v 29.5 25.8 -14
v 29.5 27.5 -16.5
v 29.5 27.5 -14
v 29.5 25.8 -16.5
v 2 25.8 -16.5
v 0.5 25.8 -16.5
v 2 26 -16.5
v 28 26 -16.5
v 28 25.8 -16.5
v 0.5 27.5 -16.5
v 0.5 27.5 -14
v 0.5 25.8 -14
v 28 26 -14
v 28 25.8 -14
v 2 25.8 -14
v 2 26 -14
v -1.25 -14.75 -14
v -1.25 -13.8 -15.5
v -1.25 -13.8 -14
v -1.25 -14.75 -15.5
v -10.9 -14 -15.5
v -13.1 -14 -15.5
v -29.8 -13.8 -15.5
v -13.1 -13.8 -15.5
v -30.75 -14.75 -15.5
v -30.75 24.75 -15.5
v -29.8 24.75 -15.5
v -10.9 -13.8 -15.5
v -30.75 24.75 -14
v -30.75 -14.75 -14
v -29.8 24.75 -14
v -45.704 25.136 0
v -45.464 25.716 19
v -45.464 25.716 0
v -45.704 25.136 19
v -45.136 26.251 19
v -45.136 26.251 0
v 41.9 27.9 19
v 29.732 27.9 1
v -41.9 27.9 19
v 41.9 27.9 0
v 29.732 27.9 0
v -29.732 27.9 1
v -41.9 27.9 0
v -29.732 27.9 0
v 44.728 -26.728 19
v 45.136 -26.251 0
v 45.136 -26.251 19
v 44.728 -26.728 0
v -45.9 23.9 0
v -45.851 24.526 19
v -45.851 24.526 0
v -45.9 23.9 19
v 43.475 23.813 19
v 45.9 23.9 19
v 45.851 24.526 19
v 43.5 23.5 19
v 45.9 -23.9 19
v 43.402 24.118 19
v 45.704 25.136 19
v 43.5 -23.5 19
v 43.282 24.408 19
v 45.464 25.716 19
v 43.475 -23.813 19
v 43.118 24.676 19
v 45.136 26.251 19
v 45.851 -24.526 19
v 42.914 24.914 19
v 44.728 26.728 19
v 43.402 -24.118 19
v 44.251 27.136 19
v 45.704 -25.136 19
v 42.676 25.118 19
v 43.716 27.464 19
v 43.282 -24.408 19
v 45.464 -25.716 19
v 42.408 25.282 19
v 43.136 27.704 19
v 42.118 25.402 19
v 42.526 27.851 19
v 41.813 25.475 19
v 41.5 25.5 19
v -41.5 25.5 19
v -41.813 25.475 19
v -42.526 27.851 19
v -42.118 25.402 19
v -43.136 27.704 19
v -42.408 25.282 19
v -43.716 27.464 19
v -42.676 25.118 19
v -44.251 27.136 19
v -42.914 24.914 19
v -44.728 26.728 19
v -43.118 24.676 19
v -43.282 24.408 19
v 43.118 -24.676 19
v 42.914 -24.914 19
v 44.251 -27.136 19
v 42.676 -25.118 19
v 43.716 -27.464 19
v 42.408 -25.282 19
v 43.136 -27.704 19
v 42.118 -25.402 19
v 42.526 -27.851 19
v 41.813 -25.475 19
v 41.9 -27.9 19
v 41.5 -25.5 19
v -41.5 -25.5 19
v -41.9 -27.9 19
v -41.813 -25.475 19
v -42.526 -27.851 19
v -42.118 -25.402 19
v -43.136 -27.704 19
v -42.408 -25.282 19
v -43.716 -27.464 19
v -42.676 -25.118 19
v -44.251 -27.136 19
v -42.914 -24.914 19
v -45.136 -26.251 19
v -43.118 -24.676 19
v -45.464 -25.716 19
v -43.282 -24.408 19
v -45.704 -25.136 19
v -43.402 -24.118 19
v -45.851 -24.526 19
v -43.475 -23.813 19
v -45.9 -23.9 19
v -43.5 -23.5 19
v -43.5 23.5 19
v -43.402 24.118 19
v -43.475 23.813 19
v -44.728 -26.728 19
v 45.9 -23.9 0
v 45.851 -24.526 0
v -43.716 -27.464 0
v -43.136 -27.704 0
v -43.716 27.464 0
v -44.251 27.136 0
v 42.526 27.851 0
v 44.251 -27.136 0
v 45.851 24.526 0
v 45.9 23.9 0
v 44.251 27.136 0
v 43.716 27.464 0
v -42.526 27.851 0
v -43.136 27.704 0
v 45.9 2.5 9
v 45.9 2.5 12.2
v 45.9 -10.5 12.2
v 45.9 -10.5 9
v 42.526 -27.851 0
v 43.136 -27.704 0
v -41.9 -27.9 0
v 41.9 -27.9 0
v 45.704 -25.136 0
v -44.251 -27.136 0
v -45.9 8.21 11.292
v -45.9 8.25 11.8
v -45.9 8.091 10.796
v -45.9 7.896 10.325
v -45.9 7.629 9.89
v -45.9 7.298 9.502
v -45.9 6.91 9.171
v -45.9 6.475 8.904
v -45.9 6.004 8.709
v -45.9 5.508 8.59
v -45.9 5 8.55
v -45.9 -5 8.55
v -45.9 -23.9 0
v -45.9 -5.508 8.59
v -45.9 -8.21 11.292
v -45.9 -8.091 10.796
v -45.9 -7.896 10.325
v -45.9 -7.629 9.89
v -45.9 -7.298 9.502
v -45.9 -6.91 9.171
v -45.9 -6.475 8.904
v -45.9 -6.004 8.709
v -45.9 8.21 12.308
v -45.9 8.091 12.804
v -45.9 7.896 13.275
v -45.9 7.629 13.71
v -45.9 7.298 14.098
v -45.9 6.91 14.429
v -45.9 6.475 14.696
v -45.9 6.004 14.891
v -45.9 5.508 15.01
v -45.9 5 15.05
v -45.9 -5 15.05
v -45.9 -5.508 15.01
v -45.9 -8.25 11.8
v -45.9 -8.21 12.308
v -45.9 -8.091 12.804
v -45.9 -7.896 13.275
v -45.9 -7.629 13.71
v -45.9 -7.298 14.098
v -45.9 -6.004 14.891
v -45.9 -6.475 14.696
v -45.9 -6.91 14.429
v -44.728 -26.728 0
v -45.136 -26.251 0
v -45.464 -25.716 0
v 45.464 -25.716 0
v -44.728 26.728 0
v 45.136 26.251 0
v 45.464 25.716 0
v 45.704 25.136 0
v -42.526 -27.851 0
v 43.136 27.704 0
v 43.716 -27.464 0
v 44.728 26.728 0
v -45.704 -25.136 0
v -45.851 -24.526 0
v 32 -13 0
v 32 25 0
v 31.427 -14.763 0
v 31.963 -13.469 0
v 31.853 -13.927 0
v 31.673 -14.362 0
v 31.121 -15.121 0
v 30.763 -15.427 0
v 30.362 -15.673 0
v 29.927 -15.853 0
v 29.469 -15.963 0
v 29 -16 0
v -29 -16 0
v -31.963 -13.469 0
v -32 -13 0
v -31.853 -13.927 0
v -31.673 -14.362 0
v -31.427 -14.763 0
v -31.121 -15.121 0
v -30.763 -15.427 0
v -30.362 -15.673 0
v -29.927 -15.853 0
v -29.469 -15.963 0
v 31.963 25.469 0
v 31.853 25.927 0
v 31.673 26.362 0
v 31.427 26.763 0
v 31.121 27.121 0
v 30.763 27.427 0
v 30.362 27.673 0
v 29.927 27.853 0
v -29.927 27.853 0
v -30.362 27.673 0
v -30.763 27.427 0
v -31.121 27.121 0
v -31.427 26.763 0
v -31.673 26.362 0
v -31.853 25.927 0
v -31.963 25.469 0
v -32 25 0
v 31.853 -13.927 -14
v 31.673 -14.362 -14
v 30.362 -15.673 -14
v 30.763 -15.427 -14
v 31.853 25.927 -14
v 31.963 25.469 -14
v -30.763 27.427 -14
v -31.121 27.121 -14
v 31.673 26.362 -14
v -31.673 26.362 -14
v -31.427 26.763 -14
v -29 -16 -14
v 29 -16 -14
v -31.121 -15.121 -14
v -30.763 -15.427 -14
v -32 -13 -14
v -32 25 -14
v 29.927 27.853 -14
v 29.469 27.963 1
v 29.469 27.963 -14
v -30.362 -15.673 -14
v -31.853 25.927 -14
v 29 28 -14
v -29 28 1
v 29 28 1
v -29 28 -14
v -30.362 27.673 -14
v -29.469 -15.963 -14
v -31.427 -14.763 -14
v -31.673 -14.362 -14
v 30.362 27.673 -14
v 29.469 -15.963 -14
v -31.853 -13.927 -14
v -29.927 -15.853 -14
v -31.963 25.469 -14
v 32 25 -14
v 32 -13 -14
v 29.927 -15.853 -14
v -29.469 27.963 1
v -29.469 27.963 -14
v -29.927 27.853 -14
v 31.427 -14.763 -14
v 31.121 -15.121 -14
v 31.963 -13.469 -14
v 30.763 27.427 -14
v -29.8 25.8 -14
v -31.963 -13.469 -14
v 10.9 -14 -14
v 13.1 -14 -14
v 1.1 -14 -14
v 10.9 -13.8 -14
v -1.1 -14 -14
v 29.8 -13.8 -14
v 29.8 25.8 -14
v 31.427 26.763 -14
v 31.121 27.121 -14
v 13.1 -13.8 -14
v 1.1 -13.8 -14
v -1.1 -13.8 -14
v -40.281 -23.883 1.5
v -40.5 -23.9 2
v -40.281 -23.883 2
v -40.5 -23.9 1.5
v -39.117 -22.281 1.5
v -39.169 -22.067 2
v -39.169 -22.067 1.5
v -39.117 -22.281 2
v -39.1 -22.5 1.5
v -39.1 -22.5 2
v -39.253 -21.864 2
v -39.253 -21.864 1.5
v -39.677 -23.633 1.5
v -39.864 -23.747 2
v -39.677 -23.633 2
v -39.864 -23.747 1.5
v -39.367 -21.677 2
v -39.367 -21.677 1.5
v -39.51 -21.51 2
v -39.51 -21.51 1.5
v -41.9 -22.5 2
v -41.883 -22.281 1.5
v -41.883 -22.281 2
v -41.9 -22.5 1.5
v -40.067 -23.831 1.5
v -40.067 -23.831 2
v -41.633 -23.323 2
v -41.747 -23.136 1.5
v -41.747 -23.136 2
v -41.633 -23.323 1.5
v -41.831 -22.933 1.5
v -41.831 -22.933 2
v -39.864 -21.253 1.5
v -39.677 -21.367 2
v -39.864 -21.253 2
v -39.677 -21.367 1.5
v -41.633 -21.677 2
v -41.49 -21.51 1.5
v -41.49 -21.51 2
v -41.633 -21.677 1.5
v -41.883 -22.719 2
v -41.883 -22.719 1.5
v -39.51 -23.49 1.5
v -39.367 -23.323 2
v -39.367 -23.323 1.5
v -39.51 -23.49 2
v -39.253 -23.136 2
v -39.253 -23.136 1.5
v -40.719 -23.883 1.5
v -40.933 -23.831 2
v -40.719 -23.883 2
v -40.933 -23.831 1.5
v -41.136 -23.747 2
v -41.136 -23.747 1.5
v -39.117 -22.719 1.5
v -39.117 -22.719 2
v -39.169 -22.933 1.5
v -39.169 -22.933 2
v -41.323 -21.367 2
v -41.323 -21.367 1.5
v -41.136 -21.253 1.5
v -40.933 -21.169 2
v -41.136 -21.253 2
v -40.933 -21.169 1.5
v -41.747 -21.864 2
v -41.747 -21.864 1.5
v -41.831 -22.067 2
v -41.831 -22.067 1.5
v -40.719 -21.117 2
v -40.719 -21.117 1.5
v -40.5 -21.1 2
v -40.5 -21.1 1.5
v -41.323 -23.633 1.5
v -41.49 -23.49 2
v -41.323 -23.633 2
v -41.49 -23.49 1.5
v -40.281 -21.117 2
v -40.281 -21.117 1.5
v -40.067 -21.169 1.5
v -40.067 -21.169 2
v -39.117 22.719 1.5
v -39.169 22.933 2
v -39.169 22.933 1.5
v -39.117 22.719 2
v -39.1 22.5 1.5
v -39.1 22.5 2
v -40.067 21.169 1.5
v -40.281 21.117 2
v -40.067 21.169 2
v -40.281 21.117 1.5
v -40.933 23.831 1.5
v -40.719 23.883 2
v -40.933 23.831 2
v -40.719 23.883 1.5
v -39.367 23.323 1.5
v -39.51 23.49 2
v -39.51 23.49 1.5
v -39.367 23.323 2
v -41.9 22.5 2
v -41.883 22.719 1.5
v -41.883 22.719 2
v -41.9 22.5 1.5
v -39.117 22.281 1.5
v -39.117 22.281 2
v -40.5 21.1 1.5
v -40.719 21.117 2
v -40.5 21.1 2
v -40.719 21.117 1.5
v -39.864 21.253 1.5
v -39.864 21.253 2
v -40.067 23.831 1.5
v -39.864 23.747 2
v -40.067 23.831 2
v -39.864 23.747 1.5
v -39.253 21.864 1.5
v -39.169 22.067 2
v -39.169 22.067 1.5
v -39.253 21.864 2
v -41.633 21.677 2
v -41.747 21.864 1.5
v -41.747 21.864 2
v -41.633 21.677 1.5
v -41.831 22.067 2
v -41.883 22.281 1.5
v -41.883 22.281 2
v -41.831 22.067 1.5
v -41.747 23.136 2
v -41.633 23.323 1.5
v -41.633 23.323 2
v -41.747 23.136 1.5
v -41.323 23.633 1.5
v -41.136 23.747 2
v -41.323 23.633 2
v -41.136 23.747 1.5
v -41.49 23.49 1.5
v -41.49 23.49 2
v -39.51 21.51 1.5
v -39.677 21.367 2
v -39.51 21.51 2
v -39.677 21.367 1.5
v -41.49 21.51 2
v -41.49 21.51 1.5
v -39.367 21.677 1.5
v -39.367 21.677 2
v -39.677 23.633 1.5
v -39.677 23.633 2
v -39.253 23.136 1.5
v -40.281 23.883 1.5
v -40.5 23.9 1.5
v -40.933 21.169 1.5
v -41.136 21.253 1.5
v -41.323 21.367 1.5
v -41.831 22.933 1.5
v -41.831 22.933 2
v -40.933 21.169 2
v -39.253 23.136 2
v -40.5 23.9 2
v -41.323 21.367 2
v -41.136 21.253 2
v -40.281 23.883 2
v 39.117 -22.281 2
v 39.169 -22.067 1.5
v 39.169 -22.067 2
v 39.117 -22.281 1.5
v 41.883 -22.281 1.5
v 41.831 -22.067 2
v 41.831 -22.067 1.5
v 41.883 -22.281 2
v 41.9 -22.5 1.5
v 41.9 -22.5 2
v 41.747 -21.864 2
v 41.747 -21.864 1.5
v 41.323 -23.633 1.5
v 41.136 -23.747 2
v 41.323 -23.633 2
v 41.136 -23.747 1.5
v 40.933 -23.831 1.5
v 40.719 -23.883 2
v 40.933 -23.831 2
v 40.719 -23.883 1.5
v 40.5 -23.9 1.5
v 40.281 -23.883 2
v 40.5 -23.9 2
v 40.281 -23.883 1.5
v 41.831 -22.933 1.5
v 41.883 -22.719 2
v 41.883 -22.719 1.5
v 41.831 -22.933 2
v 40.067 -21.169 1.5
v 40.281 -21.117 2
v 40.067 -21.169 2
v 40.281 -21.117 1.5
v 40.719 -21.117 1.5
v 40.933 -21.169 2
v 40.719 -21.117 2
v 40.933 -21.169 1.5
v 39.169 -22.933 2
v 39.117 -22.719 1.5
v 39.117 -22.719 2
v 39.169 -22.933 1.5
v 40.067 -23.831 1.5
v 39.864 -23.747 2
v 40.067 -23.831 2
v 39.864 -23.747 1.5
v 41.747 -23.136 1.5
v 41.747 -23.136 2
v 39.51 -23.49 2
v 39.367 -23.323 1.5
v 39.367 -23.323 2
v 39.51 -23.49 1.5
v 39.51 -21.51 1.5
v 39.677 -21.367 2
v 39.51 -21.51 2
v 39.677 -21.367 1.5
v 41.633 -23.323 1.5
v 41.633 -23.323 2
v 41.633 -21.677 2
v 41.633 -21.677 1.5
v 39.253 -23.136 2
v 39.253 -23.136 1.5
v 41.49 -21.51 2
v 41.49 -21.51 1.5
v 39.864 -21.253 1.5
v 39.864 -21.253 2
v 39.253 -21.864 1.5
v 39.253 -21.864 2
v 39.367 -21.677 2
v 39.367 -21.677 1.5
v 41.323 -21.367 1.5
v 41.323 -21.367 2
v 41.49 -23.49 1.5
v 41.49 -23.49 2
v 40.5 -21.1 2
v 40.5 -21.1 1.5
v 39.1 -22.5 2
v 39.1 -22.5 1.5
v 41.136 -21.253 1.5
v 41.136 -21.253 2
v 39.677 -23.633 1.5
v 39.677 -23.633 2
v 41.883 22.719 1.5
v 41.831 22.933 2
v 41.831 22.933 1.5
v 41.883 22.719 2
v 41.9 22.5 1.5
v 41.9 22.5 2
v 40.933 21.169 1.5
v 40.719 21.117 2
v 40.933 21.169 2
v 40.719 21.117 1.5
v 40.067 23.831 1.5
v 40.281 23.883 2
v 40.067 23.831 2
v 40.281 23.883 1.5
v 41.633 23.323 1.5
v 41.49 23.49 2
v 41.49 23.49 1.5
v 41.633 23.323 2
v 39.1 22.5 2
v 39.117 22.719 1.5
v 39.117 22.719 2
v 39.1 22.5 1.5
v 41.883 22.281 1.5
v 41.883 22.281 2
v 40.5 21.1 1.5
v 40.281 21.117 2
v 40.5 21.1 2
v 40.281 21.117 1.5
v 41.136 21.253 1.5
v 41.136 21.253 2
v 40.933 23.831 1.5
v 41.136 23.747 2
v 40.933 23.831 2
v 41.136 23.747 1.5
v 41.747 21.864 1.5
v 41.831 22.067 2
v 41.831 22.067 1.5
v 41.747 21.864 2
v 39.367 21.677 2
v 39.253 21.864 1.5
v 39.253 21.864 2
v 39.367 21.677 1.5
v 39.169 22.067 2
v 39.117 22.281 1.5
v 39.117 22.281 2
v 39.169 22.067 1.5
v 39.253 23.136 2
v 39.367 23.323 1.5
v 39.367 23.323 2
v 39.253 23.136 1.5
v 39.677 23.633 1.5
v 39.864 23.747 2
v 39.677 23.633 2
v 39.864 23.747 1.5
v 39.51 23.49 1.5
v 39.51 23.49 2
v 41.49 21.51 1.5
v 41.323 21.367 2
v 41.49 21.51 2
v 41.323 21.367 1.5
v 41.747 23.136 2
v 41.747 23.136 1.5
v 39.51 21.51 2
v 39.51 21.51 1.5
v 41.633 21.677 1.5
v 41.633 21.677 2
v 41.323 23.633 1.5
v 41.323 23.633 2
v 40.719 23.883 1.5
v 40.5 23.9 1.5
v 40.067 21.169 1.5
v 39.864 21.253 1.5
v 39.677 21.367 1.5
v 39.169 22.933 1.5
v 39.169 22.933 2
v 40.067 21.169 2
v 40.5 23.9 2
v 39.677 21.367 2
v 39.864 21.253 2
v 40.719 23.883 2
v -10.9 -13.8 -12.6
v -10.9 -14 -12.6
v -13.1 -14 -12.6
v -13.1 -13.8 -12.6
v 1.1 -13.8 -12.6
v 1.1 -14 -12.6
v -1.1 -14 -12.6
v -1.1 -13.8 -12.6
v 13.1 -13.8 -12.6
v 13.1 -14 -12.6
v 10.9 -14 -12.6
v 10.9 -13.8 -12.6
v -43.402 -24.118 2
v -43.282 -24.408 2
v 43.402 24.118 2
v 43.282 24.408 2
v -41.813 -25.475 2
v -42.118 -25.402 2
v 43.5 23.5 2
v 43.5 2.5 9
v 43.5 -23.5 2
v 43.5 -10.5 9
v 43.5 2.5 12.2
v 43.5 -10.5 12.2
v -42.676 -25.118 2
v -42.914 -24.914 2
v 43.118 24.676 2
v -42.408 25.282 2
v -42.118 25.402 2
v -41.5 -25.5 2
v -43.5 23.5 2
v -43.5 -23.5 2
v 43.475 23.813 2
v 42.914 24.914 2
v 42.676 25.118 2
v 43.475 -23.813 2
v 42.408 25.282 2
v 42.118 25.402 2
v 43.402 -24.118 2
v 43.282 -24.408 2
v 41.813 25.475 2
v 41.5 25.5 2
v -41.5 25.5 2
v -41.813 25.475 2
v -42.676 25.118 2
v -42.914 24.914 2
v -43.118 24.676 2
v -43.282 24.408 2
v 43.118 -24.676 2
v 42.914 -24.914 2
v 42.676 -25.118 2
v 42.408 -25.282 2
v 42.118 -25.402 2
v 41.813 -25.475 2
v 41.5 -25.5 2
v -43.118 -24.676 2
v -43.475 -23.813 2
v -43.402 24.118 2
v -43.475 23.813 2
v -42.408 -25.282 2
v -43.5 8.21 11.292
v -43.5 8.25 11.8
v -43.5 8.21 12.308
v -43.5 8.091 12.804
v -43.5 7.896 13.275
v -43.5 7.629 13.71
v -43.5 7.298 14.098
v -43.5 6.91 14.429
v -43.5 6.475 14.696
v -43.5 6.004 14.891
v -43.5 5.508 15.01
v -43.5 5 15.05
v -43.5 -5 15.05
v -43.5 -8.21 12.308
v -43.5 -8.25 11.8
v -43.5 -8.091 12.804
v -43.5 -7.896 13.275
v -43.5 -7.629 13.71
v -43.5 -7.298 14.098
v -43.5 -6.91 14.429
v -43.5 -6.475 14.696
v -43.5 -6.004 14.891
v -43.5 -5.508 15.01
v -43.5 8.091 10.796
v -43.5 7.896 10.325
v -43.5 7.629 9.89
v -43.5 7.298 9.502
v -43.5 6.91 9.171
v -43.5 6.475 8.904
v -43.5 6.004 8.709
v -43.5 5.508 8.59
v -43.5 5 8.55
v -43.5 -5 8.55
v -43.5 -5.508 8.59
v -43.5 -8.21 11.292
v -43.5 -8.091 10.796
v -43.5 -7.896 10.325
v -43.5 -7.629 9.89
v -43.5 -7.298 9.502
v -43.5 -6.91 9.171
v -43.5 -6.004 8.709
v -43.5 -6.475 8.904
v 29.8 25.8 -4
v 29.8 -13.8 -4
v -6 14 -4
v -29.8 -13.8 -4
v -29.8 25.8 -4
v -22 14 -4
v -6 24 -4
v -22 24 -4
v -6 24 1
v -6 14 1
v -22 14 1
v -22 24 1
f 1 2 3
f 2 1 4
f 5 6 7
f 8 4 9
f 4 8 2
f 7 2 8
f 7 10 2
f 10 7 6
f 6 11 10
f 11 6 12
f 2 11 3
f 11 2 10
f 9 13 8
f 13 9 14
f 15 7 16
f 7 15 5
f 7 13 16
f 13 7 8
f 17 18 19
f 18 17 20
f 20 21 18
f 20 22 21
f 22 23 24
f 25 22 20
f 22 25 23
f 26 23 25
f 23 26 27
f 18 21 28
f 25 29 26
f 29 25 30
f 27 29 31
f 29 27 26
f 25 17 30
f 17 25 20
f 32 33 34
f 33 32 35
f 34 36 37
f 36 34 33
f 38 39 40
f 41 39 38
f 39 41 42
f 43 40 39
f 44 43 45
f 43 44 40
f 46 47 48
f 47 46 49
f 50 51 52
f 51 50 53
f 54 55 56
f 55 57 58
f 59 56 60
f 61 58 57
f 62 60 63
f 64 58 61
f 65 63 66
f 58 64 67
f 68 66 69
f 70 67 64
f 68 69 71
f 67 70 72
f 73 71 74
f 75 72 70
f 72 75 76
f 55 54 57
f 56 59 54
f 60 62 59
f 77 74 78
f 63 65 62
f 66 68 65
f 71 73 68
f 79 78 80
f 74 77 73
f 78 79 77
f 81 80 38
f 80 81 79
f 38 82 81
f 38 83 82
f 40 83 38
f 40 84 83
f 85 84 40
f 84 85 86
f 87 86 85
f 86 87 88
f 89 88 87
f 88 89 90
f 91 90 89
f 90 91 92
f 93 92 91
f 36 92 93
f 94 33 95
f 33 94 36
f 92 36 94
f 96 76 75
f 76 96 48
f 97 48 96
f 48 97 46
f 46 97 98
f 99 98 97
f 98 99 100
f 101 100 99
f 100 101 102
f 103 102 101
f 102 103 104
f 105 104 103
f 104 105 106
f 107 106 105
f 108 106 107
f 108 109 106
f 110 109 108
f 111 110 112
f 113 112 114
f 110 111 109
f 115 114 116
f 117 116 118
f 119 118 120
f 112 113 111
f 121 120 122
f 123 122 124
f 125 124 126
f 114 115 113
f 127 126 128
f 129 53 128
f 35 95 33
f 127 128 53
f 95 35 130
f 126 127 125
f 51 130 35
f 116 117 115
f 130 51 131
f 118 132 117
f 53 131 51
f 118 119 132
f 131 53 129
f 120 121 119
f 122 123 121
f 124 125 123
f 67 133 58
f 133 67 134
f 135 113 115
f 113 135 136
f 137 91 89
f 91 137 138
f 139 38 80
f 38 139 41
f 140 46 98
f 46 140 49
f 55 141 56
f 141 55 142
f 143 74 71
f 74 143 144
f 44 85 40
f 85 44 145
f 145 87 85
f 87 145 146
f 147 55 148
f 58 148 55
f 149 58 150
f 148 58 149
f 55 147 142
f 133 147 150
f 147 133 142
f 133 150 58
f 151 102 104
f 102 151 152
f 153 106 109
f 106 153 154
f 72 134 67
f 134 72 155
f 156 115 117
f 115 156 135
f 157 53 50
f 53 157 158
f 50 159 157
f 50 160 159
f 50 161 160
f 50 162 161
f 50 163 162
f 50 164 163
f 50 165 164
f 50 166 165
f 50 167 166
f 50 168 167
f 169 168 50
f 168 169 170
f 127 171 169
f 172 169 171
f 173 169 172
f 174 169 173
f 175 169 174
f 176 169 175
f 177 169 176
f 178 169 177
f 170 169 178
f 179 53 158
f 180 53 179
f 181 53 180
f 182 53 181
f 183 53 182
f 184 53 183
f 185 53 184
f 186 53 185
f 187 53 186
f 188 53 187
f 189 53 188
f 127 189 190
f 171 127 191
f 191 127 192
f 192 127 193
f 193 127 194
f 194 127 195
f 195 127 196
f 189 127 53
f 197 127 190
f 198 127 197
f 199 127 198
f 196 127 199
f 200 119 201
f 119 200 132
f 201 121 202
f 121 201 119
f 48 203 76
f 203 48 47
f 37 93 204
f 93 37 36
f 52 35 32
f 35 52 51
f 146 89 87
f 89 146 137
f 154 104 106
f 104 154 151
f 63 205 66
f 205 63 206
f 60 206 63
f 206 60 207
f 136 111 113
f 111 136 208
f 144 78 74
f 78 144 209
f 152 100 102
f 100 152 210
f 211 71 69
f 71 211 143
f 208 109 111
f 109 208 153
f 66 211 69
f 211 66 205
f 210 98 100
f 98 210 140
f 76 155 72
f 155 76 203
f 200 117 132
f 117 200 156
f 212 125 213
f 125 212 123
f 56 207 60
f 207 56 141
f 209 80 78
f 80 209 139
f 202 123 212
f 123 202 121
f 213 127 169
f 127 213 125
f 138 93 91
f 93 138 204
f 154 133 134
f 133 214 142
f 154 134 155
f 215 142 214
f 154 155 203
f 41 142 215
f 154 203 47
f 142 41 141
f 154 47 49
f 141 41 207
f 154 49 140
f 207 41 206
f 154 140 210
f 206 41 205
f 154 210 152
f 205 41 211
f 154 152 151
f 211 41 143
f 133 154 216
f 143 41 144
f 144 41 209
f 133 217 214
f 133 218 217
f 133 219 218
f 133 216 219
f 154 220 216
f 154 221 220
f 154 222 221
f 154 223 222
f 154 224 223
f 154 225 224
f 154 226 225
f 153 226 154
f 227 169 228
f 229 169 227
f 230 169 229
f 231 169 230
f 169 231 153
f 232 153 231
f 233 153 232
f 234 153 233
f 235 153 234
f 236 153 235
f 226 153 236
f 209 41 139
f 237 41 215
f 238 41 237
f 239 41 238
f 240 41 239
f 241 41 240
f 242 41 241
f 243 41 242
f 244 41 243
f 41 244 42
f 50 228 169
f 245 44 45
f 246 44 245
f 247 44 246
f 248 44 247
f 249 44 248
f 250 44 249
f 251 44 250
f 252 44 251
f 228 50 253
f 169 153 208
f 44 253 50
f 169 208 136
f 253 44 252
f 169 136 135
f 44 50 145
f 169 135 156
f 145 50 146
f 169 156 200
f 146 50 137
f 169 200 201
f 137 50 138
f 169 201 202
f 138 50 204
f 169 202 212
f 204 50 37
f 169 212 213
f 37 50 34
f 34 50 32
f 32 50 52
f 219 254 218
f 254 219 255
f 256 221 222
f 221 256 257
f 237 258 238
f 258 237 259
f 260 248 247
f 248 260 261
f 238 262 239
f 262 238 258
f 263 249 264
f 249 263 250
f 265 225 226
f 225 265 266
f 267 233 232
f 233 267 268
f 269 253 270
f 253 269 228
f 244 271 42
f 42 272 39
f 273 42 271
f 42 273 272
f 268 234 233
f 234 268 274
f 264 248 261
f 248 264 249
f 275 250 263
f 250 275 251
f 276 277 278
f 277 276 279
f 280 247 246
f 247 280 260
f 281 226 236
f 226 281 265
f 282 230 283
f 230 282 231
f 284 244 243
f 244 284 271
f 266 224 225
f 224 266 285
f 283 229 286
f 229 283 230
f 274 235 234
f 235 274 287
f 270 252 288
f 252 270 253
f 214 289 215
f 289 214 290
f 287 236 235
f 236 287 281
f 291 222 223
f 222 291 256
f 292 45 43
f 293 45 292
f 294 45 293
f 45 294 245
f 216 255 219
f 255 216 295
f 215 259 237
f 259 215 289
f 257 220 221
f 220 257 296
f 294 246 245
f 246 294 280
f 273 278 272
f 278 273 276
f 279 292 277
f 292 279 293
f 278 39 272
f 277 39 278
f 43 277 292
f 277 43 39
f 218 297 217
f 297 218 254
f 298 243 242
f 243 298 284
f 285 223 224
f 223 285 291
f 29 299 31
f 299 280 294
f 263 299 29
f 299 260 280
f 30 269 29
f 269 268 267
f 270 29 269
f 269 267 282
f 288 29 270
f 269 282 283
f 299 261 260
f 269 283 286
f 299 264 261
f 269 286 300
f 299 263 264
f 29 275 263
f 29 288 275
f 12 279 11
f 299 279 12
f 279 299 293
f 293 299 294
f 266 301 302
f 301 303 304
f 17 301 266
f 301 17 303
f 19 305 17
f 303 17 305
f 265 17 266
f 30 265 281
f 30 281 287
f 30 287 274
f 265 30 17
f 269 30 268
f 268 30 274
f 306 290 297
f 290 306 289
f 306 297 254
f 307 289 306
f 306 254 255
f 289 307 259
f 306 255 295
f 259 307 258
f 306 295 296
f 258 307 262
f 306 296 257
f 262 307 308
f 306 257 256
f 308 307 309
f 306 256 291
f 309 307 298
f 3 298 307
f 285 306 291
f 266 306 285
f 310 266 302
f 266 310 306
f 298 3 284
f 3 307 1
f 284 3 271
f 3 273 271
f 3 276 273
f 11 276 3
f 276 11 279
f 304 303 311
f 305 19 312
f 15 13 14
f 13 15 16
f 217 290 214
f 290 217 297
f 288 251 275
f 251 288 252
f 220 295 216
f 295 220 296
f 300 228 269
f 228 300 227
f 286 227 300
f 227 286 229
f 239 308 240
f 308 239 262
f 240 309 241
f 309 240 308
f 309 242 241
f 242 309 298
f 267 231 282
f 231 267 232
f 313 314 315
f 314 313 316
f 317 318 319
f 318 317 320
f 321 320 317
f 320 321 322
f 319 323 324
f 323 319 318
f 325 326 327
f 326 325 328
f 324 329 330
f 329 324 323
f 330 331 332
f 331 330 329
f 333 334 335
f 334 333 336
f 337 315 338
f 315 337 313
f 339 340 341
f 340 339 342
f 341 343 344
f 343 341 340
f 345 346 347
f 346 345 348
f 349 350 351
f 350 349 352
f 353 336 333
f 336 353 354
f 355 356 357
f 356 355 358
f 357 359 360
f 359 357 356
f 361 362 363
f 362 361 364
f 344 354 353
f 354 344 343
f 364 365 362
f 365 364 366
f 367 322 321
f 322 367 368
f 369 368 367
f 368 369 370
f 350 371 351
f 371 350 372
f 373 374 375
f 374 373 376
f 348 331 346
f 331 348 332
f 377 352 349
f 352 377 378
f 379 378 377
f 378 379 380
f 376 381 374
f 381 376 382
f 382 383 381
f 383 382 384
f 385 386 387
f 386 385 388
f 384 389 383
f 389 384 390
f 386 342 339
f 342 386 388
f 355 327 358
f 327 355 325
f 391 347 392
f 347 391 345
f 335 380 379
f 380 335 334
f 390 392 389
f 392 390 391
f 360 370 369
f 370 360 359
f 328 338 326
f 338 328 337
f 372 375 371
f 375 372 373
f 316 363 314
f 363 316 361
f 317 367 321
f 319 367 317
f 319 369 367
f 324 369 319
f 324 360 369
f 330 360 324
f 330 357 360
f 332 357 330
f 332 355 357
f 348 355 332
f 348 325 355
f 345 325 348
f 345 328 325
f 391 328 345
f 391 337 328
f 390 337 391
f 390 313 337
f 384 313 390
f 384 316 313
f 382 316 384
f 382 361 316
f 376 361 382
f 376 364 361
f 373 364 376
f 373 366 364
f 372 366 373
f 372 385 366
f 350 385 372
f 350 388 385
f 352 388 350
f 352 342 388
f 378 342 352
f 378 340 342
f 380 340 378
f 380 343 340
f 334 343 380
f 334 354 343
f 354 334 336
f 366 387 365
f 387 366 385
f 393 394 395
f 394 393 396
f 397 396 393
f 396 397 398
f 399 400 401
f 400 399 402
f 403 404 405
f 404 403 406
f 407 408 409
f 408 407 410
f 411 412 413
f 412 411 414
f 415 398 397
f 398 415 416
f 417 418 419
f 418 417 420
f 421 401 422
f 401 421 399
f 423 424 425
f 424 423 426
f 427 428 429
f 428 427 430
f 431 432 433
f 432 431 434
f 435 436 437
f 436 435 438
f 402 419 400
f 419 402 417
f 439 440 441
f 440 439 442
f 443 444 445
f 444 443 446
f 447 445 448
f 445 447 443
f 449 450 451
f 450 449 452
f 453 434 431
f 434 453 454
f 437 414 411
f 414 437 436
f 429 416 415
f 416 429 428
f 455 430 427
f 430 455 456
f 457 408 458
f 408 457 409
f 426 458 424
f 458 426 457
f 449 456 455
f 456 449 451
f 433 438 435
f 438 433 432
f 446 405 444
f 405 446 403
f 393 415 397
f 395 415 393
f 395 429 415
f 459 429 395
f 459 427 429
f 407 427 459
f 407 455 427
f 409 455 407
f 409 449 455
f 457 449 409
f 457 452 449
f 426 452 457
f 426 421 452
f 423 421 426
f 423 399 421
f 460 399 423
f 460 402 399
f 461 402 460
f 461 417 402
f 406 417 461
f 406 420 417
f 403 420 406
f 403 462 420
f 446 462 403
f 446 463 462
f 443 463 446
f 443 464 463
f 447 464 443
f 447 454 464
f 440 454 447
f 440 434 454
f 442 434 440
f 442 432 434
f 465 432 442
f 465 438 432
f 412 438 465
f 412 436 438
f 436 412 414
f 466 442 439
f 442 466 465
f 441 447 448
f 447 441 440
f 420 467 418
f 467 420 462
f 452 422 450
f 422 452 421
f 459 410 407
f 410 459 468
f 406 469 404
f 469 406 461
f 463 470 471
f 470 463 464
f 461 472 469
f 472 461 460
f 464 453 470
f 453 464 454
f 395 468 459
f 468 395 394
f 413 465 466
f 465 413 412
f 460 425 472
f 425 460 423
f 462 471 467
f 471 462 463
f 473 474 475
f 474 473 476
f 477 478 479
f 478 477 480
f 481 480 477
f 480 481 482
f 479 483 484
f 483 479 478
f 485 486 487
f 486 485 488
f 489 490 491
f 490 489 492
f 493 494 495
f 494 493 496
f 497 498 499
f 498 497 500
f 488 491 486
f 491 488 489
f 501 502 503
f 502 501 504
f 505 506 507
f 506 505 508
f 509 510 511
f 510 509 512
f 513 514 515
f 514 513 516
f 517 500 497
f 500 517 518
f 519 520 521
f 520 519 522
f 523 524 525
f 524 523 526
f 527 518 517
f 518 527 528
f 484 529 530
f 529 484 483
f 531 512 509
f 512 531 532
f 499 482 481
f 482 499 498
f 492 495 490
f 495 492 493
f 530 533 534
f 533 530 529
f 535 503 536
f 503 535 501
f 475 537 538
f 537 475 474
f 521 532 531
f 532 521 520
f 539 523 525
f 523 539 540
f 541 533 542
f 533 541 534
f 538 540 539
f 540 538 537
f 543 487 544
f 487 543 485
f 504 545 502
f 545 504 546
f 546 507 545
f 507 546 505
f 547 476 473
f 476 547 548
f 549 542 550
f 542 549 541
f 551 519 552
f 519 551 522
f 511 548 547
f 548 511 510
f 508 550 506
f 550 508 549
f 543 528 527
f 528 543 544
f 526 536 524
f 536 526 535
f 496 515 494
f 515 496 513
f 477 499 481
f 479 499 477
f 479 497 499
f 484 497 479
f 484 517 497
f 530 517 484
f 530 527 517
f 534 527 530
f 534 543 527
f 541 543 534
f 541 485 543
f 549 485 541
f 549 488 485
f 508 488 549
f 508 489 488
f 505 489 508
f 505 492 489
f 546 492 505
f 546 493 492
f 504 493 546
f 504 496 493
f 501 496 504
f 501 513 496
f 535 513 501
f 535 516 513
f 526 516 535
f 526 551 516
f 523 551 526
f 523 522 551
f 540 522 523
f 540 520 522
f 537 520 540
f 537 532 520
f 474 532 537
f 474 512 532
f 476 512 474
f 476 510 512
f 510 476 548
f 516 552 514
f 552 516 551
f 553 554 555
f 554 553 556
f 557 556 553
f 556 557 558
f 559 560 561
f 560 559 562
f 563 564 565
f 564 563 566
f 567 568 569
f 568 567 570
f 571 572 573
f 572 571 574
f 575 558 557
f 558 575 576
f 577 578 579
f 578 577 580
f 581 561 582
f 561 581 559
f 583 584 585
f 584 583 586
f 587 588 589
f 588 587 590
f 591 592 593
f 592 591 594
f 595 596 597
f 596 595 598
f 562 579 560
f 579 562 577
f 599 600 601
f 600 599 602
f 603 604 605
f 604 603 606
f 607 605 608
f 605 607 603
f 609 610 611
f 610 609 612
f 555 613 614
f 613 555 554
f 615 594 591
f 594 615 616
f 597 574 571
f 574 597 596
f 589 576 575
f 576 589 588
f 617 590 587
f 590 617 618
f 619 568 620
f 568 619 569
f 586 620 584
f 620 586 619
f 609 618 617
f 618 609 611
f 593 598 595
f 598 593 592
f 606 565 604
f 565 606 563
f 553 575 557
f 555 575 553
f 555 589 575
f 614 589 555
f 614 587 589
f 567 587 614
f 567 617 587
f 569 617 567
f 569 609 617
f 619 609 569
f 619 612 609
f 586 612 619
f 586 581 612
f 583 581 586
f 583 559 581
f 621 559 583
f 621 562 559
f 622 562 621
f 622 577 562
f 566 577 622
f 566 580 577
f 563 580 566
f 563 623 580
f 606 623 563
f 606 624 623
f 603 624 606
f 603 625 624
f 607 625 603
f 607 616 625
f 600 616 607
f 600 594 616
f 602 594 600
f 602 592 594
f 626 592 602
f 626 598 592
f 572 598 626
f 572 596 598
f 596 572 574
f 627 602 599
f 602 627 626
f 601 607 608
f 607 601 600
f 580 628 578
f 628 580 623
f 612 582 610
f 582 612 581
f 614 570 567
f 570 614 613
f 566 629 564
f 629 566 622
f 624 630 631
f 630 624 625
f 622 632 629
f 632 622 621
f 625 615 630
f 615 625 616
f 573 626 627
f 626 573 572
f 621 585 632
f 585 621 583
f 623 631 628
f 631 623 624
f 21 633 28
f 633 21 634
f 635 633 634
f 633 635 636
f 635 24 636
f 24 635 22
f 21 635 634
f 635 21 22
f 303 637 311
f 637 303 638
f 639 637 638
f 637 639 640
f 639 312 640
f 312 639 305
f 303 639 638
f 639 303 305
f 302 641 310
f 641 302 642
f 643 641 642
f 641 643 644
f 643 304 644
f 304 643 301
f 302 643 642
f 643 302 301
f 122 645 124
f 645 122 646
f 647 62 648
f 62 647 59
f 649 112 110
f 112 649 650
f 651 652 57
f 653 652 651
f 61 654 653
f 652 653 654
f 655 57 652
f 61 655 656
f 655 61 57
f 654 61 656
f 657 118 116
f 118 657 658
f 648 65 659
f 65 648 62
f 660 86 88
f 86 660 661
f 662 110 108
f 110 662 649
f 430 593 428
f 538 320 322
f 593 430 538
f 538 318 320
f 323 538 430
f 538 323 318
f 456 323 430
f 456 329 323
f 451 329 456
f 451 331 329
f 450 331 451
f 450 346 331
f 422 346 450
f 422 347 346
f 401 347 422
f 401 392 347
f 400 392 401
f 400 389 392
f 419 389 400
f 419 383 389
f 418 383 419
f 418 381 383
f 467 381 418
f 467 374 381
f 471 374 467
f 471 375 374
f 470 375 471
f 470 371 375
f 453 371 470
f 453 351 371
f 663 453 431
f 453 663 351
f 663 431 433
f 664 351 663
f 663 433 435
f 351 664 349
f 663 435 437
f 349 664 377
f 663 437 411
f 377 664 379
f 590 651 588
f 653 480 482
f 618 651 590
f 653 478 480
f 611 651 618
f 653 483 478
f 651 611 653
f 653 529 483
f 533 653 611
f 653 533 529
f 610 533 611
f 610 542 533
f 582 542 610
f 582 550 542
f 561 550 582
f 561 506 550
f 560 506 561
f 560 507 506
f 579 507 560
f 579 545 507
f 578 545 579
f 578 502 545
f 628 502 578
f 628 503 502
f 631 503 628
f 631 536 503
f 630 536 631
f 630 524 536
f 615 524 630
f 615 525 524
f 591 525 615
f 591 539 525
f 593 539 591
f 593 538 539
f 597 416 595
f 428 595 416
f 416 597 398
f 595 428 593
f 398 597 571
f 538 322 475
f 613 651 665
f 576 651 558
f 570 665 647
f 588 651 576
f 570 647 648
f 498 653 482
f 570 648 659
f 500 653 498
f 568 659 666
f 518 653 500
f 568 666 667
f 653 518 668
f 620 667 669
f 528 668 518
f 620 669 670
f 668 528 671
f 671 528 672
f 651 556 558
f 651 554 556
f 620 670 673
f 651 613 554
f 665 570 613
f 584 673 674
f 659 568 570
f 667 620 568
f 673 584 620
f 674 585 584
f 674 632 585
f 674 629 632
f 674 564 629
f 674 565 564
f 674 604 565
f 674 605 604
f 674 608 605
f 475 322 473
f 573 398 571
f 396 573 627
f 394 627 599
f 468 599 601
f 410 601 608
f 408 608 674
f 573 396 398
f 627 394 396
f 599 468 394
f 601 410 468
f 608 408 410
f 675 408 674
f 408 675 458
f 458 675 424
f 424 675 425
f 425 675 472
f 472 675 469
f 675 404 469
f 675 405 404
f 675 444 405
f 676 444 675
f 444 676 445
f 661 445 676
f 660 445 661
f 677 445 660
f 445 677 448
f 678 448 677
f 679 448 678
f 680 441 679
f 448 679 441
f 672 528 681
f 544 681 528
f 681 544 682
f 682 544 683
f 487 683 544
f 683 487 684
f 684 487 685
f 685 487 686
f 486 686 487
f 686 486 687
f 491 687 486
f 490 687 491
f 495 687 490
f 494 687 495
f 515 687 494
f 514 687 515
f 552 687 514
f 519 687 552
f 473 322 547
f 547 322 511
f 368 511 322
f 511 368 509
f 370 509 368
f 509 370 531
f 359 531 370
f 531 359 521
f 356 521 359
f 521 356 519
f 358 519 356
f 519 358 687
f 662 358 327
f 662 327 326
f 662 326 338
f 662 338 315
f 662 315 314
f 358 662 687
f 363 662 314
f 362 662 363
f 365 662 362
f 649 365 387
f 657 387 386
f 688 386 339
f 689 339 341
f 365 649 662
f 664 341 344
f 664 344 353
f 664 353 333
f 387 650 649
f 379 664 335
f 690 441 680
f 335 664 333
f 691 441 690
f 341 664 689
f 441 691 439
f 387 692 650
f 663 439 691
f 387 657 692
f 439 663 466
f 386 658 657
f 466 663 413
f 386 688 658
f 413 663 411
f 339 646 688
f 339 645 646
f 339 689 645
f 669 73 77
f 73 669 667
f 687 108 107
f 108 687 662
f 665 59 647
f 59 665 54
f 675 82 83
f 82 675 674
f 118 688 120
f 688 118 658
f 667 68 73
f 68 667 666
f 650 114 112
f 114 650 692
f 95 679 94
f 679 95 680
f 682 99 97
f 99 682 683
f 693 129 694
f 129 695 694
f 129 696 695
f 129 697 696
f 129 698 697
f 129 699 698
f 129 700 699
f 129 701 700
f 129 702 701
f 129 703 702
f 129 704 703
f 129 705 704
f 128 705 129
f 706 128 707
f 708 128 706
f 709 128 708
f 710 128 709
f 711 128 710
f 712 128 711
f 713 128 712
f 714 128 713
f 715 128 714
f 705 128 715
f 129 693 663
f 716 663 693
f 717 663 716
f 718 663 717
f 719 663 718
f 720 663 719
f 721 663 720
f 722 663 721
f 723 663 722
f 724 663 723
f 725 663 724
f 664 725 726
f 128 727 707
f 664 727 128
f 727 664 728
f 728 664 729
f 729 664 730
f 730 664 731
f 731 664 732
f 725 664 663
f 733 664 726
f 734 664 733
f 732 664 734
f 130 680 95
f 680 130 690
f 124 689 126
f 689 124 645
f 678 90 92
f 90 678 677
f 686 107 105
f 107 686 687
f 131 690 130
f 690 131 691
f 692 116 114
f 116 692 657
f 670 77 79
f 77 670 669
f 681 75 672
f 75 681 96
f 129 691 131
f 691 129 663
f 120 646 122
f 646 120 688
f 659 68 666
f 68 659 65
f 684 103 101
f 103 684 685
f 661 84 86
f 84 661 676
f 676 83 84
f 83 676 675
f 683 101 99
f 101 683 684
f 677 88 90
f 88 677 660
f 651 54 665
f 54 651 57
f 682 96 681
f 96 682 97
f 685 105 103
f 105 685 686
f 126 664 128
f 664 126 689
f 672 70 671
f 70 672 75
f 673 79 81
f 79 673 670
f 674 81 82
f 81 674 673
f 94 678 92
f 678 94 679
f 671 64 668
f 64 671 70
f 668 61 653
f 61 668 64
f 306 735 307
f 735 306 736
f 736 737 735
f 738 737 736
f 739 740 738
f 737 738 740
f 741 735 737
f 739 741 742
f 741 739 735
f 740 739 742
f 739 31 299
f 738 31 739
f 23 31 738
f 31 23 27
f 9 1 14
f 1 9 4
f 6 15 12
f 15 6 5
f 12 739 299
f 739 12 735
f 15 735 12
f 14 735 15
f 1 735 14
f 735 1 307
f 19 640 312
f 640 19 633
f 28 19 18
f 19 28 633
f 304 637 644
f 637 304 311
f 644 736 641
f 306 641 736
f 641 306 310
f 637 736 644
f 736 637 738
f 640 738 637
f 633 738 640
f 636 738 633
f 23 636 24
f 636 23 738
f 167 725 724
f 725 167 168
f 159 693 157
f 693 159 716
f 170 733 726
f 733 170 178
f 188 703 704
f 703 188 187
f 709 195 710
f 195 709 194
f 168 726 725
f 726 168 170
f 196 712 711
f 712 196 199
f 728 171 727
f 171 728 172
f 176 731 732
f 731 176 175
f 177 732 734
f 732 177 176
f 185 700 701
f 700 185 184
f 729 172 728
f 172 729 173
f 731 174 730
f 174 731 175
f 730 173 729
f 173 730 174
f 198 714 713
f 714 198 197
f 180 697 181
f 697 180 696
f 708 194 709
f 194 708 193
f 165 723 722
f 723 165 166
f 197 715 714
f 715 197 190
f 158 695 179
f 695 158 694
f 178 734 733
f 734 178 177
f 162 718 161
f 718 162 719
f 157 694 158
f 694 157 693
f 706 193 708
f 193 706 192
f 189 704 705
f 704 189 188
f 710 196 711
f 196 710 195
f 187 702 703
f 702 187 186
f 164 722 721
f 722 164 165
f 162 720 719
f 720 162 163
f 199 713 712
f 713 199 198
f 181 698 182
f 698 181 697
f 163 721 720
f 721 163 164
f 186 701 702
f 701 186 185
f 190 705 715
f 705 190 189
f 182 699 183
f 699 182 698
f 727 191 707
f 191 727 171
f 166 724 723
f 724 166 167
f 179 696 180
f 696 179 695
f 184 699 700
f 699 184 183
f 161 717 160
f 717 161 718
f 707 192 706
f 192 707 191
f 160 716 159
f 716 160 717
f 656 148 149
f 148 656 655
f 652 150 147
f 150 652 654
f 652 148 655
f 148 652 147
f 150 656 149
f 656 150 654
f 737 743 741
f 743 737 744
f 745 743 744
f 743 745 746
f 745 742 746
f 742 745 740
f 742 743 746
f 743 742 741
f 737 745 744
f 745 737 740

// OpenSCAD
// ============================================================================
// CYD ESP32-C5 FlightRadar & Aerospace Instrument - 3D Printable Enclosure
// Compatible with: RockBase NM-CYD-C5 (ESP32-C5 2.8" TFT Touch) + GY-GPS6MV2
// Features Dedicated Internal Compartments for BOTH GPS Receiver & Patch Antenna!
// Designed for 3D Printing: FDM (PLA/PETG/ABS) or Resin (SLA)
// ============================================================================

/* [Model View Selection] */
// Select which component to preview or render
part_to_show = "rear_backpack"; // [assembly:Full Assembly, bezel:Standard Front Bezel, rear_backpack:Rear Enclosure with GPS Backpack, stand:Desk Stand 25deg, bezel_toppod:Top-Pod Bezel, rear_toppod:Top-Pod Rear Enclosure]

/* [Print & Fit Tolerances] */
nozzle_dia      = 0.4;  // Nozzle diameter (mm)
clearance       = 0.5;  // General clearance for slide/drop-in fit (mm)
wall_t          = 2.4;  // Enclosure wall thickness (mm)
floor_t         = 2.0;  // Rear enclosure floor thickness (mm)
bezel_t         = 4.0;  // Front bezel thickness (mm)

/* [Hardware Dimensions] */
pcb_w           = 86.0; // NM-CYD-C5 PCB width (mm)
pcb_h           = 50.0; // NM-CYD-C5 PCB height (mm)
pcb_t           = 1.6;  // PCB thickness (mm)
standoff_h      = 6.0;  // Standoff height off rear wall (mm)

// Corner Mounting Holes (M3 / 81mm x 45mm spacing)
screw_dist_x    = 81.0; 
screw_dist_y    = 45.0;
screw_hole_d    = 3.2;  // M3 clearance hole
screw_head_d    = 6.0;  // M3 socket head diameter
screw_head_h    = 2.2;  // M3 counterbore depth
boss_d          = 7.0;  // Standoff boss outer diameter
boss_pilot_d    = 2.8;  // Standoff pilot hole for self-tapping M3

/* [Display Cutout] */
disp_view_w     = 61.0; // Viewable LCD window width (mm)
disp_view_h     = 44.0; // Viewable LCD window height (mm)
disp_glass_w    = 69.5; // Glass panel outer width (mm)
disp_glass_h    = 49.5; // Glass panel outer height (mm)
disp_recess_d   = 1.8;  // Glass panel recess depth (mm)

/* [WS2812 Indicator Beacon] */
led_x           = -28.0;// LED X offset from center (mm)
led_y           = 22.5; // LED Y offset from center (mm)
led_aperture_d  = 3.2;  // Outer light port diameter (mm)
led_cone_d      = 5.0;  // Inner light funnel diameter (mm)

/* [GY-GPS6MV2 Receiver & Ceramic Antenna Chambers] */
gps_rx_w        = 26.5; // Receiver module bay width (mm)
gps_rx_h        = 36.5; // Receiver module bay length (mm)
gps_ant_w       = 26.0; // Ceramic antenna pocket width (mm)
gps_ant_h       = 26.0; // Ceramic antenna pocket length (mm)
gps_ant_d       = 9.0;  // Ceramic antenna pocket depth (mm)

/* [GPS Backpack Dimensions] */
bp_w            = 64.0; // Backpack outer width (mm)
bp_h            = 44.0; // Backpack outer height (mm)
bp_d            = 14.0; // Backpack depth extending behind shell (mm)

/* [Desk Stand Angle] */
stand_tilt_deg  = 25.0; // Desktop viewing tilt angle (degrees)

// Calculated bounding parameters
outer_w         = pcb_w + (wall_t * 2) + (clearance * 2); // 91.8 -> 93.0 mm
outer_h         = pcb_h + (wall_t * 2) + (clearance * 2); // 55.8 -> 57.0 mm
rear_depth      = 19.0; // Main enclosure depth (mm)

$fn = 40; // Circle facet resolution

// ============================================================================
// TOP-LEVEL SELECTION
// ============================================================================
if (part_to_show == "assembly") {
    assembly_view();
} else if (part_to_show == "bezel") {
    front_bezel();
} else if (part_to_show == "rear_backpack") {
    rear_enclosure_backpack();
} else if (part_to_show == "stand") {
    desk_stand_25deg();
} else if (part_to_show == "bezel_toppod") {
    front_bezel_toppod();
} else if (part_to_show == "rear_toppod") {
    rear_enclosure_toppod();
}

// ============================================================================
// MODULE: FRONT BEZEL (Standard 93x57mm)
// ============================================================================
module front_bezel() {
    difference() {
        // Outer Faceplate with Rounded Corners
        hull() {
            for (x = [-outer_w/2 + 4, outer_w/2 - 4]) {
                for (y = [-outer_h/2 + 4, outer_h/2 - 4]) {
                    translate([x, y, 0])
                        cylinder(r = 4, h = bezel_t);
                }
            }
        }

        // 1. LCD Active Display Aperture (with 45° touch bevel)
        translate([0, 0, -0.1]) {
            cube([disp_view_w, disp_view_h, bezel_t + 0.2], center = true);
        }
        // Chamfered bezel edge for smooth finger touch swipe
        translate([0, 0, bezel_t]) {
            hull() {
                cube([disp_view_w + 3.0, disp_view_h + 3.0, 0.01], center = true);
                translate([0, 0, -1.5])
                    cube([disp_view_w, disp_view_h, 0.01], center = true);
            }
        }

        // 2. Rear LCD Glass Panel Seating Recess
        translate([0, 0, -0.1]) {
            cube([disp_glass_w, disp_glass_h, disp_recess_d + 0.1], center = true);
        }

        // 3. WS2812 Beacon Light Guide
        translate([led_x, led_y, -0.1]) {
            cylinder(d1 = led_cone_d, d2 = led_aperture_d, h = bezel_t + 0.2);
        }

        // 4. Corner M3 Counterbored Screw Holes
        for (x = [-screw_dist_x/2, screw_dist_x/2]) {
            for (y = [-screw_dist_y/2, screw_dist_y/2]) {
                translate([x, y, -0.1]) {
                    cylinder(d = screw_hole_d, h = bezel_t + 0.2);
                    translate([0, 0, bezel_t - screw_head_h + 0.1])
                        cylinder(d = screw_head_d, h = screw_head_h + 0.2);
                }
            }
        }
    }
}

// ============================================================================
// MODULE: REAR ENCLOSURE (With Integrated GPS Backpack & Antenna Tray)
// ============================================================================
module rear_enclosure_backpack() {
    difference() {
        union() {
            // Main Outer Rounded Body
            hull() {
                for (x = [-outer_w/2 + 4, outer_w/2 - 4]) {
                    for (y = [-outer_h/2 + 4, outer_h/2 - 4]) {
                        translate([x, y, 0])
                            cylinder(r = 4, h = rear_depth);
                    }
                }
            }

            // GPS Backpack Outer Extension (Extending backwards)
            translate([-bp_w/2, -16.0, -bp_d]) {
                hull() {
                    for (x = [3, bp_w - 3]) {
                        for (y = [3, bp_h - 3]) {
                            translate([x, y, 0])
                                cylinder(r = 3, h = bp_d + 1);
                        }
                    }
                }
            }

            // Standoff Bosses for PCB Mounting
            for (x = [-screw_dist_x/2, screw_dist_x/2]) {
                for (y = [-screw_dist_y/2, screw_dist_y/2]) {
                    translate([x, y, floor_t])
                        cylinder(d = boss_d, h = standoff_h);
                }
            }

            // Internal Antenna Retention Lips
            translate([15.0, 13.0, -bp_d + 2.0]) {
                difference() {
                    cube([gps_ant_w + 3.0, gps_ant_h + 3.0, gps_ant_d], center = true);
                    cube([gps_ant_w, gps_ant_h, gps_ant_d + 1], center = true);
                }
            }

            // Internal GPS Receiver Board Rails
            translate([-16.0, 5.0, -bp_d + 2.0]) {
                difference() {
                    cube([gps_rx_w + 3.0, gps_rx_h + 3.0, 7.0], center = true);
                    cube([gps_rx_w, gps_rx_h, 8.0], center = true);
                }
            }
        }

        // 1. Hollow Inner PCB Cavity
        translate([0, 0, floor_t]) {
            hull() {
                for (x = [-(pcb_w + clearance*2)/2 + 2, (pcb_w + clearance*2)/2 - 2]) {
                    for (y = [-(pcb_h + clearance*2)/2 + 2, (pcb_h + clearance*2)/2 - 2]) {
                        translate([x, y, 0])
                            cylinder(r = 2, h = rear_depth + 1);
                    }
                }
            }
        }

        // 2. Hollow GPS Backpack Cavity
        translate([0, 6.0, -bp_d + 2.0]) {
            cube([bp_w - 4.4, bp_h - 4.4, bp_d + 2.0], center = true);
        }

        // 3. M3 Screw Pilot Holes in Standoff Bosses
        for (x = [-screw_dist_x/2, screw_dist_x/2]) {
            for (y = [-screw_dist_y/2, screw_dist_y/2]) {
                translate([x, y, floor_t - 0.5])
                    cylinder(d = boss_pilot_d, h = standoff_h + 1.0);
            }
        }

        // 4. USB-C Power Connector Cutout (Left Side Wall)
        translate([-outer_w/2, 0, floor_t + standoff_h + pcb_t/2 + 3]) {
            hull() {
                translate([0, -5, 0]) rotate([0, 90, 0]) cylinder(d = 6.5, h = wall_t * 2, center = true);
                translate([0,  5, 0]) rotate([0, 90, 0]) cylinder(d = 6.5, h = wall_t * 2, center = true);
            }
        }

        // 5. MicroSD Card Access Slot (Right Side Wall)
        translate([outer_w/2, -4, floor_t + standoff_h + pcb_t + 1]) {
            cube([wall_t * 2, 13.0, 3.2], center = true);
        }

        // 6. Direct Wire Routing Aperture from GPS to P5 LP-UART Header
        translate([-14.0, 19.0, -2.0]) {
            cube([16.0, 10.0, floor_t + 4.0], center = true);
        }

        // 7. Tactical Airflow Cooling Louvers on Backpack Base
        for (i = [-1 : 1]) {
            translate([i * 12, -6, -bp_d - 0.1]) {
                cube([2.2, 16.0, 3.0], center = true);
            }
        }
    }
}

// ============================================================================
// MODULE: DESKTOP STAND (25-DEGREE ERGONOMIC CRADLE)
// ============================================================================
module desk_stand_25deg() {
    stand_w = 78.0;
    stand_d = 72.0;
    stand_h = 32.0;

    difference() {
        // Main Base Block
        translate([-stand_w/2, -stand_d/2, 0]) {
            cube([stand_w, stand_d, stand_h]);
        }

        // 25-Degree Tilted Enclosure Resting Cradle Pocket
        translate([0, 10, 14]) {
            rotate([stand_tilt_deg, 0, 0]) {
                cube([outer_w + 1.4, outer_h + 1.4, 40.0], center = true);
            }
        }

        // Central Clearance Recess for GPS Backpack
        translate([0, -2, stand_h/2]) {
            cube([bp_w + 2.0, stand_d, stand_h + 2], center = true);
        }

        // Rear USB-C Cable Route Arch
        translate([0, -stand_d/2 + 10, -0.1]) {
            cylinder(d = 16.0, h = stand_h + 1);
            translate([-8, -15, 0])
                cube([16.0, 20.0, stand_h + 1]);
        }

        // Underside Rubber Foot Sockets
        for (fx = [-stand_w/2 + 8, stand_w/2 - 8]) {
            for (fy = [-stand_d/2 + 8, stand_d/2 - 8]) {
                translate([fx, fy, -0.1])
                    cylinder(d = 8.5, h = 1.8);
            }
        }
    }
}

// ============================================================================
// MODULE: TACTICAL AVIONICS TOP-POD BEZEL (93x82mm with Radome Brow)
// ============================================================================
module front_bezel_toppod() {
    top_h = 82.0;
    difference() {
        hull() {
            for (x = [-outer_w/2 + 4, outer_w/2 - 4]) {
                for (y = [-top_h/2 + 4, top_h/2 - 4]) {
                    translate([x, y, 0]) cylinder(r = 4, h = bezel_t);
                }
            }
        }
        // LCD window centered in lower 57mm
        translate([0, -12.5, -0.1]) cube([disp_view_w, disp_view_h, bezel_t + 0.2], center = true);
        translate([0, -12.5, -0.1]) cube([disp_glass_w, disp_glass_h, disp_recess_d + 0.1], center = true);
        translate([led_x, -12.5 + 22.5, -0.1]) cylinder(d1 = 5.0, d2 = 3.2, h = bezel_t + 0.2);
        for (x = [-screw_dist_x/2, screw_dist_x/2]) {
            for (y = [-12.5 - screw_dist_y/2, -12.5 + screw_dist_y/2]) {
                translate([x, y, -0.1]) {
                    cylinder(d = 3.2, h = bezel_t + 0.2);
                    translate([0, 0, bezel_t - 2.0]) cylinder(d = 6.0, h = 2.2);
                }
            }
        }
    }
}

// ============================================================================
// MODULE: TACTICAL AVIONICS TOP-POD REAR ENCLOSURE
// ============================================================================
module rear_enclosure_toppod() {
    top_h = 82.0;
    difference() {
        union() {
            hull() {
                for (x = [-outer_w/2 + 4, outer_w/2 - 4]) {
                    for (y = [-top_h/2 + 4, top_h/2 - 4]) {
                        translate([x, y, 0]) cylinder(r = 4, h = 20.0);
                    }
                }
            }
            // Standoffs for lower PCB
            for (x = [-screw_dist_x/2, screw_dist_x/2]) {
                for (y = [-12.5 - screw_dist_y/2, -12.5 + screw_dist_y/2]) {
                    translate([x, y, floor_t]) cylinder(d = boss_d, h = standoff_h);
                }
            }
            // Top antenna tray
            translate([15.0, 24.0, floor_t]) {
                difference() {
                    cube([gps_ant_w + 3.0, gps_ant_h + 3.0, gps_ant_d], center = true);
                    cube([gps_ant_w, gps_ant_h, gps_ant_d + 1], center = true);
                }
            }
            // Top receiver PCB slot
            translate([-16.0, 24.0, floor_t]) {
                difference() {
                    cube([gps_rx_w + 3.0, gps_rx_h + 3.0, 8.0], center = true);
                    cube([gps_rx_w, gps_rx_h, 9.0], center = true);
                }
            }
        }
        // Hollow main cavity
        translate([0, 0, floor_t]) {
            hull() {
                for (x = [-outer_w/2 + 3, outer_w/2 - 3]) {
                    for (y = [-top_h/2 + 3, top_h/2 - 3]) {
                        translate([x, y, 0]) cylinder(r = 2, h = 22.0);
                    }
                }
            }
        }
        // Ports & screw holes
        for (x = [-screw_dist_x/2, screw_dist_x/2]) {
            for (y = [-12.5 - screw_dist_y/2, -12.5 + screw_dist_y/2]) {
                translate([x, y, floor_t - 0.5]) cylinder(d = boss_pilot_d, h = standoff_h + 1.0);
            }
        }
        // USB-C on left wall
        translate([-outer_w/2, -12.5, floor_t + standoff_h + pcb_t/2 + 3])
            cube([wall_t * 2, 13.0, 7.0], center = true);
    }
}

// ============================================================================
// ASSEMBLY VIEW HELPER
// ============================================================================
module assembly_view() {
    color([0.2, 0.2, 0.25, 0.9])
        rear_enclosure_backpack();
    color([0.3, 0.3, 0.35, 0.8])
        translate([0, 0, rear_depth + 4])
            front_bezel();
}
